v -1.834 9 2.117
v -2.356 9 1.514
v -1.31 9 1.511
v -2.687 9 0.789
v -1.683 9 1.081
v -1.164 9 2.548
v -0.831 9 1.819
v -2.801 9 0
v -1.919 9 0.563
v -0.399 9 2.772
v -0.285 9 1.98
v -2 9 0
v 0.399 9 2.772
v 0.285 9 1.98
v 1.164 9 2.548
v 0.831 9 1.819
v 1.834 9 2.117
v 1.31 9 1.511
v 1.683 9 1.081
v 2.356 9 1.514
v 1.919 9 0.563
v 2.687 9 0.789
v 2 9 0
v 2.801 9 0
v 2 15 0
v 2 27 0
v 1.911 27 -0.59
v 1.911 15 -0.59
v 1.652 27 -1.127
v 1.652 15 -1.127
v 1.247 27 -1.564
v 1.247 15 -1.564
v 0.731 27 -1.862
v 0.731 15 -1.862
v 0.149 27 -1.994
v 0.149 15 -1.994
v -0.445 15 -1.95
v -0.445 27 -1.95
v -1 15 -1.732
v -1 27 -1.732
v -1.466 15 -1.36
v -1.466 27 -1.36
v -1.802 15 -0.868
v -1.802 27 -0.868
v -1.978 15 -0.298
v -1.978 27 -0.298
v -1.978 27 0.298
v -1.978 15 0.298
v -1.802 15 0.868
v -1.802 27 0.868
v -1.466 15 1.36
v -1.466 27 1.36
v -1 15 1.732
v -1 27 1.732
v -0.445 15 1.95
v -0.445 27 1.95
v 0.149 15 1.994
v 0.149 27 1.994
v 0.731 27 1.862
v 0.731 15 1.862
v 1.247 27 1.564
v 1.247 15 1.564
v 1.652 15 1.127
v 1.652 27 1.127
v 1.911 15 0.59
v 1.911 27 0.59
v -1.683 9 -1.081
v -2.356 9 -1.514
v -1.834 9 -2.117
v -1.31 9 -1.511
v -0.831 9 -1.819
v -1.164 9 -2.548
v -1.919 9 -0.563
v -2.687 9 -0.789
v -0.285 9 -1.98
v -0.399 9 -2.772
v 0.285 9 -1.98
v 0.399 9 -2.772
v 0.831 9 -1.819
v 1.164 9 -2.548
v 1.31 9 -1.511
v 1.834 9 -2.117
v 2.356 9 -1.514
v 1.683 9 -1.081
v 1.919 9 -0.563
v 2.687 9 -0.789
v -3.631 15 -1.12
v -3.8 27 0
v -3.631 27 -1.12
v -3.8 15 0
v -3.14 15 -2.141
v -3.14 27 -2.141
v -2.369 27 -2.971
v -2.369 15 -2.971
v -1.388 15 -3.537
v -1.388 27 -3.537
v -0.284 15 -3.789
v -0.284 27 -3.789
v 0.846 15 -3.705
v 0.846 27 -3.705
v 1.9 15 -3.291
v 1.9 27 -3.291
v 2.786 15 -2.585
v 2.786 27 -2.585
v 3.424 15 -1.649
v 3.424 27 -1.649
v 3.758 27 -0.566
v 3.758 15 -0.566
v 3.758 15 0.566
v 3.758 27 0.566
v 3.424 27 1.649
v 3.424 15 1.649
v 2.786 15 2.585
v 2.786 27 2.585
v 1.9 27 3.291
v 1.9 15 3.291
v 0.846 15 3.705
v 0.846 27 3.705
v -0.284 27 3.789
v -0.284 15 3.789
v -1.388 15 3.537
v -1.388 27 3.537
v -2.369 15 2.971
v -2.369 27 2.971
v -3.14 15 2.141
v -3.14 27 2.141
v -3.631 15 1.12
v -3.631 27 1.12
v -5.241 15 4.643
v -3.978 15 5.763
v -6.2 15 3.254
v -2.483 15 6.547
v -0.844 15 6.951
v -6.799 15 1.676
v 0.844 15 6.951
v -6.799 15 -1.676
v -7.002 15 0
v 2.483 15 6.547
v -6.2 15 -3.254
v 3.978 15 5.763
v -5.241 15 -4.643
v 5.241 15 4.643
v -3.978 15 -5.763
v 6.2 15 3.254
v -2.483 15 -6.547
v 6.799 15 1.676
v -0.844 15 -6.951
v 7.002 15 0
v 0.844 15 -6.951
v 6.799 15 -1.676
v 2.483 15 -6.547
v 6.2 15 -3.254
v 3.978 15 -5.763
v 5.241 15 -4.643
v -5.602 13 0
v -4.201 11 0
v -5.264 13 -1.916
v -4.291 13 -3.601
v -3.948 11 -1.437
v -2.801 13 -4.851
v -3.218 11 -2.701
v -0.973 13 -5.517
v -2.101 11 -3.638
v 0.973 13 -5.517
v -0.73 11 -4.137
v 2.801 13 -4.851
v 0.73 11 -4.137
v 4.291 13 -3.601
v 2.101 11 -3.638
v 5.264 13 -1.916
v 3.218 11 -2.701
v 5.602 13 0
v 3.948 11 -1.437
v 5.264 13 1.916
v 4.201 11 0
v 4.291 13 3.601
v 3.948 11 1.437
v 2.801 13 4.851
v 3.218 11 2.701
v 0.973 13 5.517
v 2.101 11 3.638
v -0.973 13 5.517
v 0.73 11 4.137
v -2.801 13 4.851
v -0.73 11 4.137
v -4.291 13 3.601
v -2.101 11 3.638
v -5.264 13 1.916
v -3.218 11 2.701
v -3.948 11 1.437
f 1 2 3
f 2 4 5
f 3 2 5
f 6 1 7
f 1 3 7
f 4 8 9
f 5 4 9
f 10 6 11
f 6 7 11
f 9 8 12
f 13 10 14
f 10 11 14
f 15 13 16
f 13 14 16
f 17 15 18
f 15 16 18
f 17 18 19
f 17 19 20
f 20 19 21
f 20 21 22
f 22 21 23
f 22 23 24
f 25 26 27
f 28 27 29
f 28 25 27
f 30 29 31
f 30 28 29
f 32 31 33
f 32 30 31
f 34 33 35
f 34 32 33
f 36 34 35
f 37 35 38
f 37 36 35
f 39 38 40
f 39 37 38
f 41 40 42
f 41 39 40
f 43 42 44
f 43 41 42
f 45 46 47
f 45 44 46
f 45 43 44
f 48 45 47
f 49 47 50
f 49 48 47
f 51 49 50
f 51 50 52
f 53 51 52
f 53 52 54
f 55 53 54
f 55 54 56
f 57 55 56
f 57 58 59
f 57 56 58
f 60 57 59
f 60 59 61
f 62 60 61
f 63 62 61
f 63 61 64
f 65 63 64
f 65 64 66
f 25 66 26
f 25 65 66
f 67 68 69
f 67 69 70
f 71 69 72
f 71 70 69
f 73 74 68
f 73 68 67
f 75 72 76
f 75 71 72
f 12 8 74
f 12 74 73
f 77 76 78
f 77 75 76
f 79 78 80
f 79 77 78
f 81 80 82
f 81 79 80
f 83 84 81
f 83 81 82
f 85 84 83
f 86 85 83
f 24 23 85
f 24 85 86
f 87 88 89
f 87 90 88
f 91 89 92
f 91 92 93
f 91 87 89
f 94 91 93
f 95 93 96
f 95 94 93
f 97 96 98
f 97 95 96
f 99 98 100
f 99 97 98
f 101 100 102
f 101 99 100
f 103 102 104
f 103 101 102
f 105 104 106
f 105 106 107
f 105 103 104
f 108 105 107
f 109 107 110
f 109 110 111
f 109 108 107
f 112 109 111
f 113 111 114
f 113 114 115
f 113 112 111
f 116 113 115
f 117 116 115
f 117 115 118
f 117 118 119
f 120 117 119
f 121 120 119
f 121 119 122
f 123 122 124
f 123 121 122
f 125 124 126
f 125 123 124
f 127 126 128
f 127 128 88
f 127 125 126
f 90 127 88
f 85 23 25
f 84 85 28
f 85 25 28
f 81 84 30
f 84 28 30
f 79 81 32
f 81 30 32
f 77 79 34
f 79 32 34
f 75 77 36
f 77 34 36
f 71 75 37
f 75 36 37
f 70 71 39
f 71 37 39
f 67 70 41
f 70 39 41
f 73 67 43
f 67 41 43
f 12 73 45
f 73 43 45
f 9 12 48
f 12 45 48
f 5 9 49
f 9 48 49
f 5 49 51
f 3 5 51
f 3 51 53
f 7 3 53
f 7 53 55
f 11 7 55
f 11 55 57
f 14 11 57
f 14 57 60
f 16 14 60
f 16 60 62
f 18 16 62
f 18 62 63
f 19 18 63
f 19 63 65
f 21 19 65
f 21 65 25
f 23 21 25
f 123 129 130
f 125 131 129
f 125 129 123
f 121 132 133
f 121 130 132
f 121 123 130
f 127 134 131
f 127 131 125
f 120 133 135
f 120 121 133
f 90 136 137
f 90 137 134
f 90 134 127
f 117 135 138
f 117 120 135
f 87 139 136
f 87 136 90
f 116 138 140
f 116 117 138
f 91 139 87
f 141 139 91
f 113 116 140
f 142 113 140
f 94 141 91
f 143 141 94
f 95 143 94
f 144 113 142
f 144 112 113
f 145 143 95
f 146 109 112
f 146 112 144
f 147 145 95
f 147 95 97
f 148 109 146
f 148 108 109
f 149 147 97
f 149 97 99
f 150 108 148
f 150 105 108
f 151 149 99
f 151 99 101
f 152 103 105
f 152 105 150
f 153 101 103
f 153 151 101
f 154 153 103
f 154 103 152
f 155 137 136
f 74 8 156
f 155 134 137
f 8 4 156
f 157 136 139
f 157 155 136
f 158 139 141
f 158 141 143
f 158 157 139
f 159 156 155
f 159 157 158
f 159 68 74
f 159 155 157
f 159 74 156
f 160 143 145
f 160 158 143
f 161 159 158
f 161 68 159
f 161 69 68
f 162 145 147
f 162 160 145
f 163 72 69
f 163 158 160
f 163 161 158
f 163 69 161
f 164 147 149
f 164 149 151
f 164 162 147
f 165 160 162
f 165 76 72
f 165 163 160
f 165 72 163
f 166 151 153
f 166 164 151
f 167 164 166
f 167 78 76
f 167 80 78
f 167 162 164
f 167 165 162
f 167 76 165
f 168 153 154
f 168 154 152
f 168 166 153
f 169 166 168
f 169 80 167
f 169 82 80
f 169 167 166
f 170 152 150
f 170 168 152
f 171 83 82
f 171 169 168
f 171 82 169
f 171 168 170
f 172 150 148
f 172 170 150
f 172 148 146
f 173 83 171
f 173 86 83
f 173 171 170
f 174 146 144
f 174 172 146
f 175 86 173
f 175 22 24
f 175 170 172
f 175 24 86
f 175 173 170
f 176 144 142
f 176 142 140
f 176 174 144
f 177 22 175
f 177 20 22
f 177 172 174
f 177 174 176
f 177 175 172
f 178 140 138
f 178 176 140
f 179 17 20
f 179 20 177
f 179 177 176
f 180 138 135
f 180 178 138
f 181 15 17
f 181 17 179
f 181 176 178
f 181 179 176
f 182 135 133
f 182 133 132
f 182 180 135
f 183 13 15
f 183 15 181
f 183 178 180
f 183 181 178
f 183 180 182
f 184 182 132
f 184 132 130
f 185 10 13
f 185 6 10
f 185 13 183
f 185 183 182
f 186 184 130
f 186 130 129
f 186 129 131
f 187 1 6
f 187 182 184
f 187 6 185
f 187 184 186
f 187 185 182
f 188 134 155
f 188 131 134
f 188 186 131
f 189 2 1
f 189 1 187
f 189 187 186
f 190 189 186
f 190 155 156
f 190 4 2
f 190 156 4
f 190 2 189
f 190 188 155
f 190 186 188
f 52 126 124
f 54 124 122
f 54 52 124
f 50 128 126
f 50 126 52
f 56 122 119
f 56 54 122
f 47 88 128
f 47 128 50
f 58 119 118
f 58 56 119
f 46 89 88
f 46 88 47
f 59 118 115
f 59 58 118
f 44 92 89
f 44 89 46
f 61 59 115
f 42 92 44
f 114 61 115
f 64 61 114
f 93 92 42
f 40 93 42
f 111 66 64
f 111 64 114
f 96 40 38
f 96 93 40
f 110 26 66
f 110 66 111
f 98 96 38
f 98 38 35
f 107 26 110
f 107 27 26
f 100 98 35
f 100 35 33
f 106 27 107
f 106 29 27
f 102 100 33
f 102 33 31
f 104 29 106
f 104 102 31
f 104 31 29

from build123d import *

# Parameters (mm, degrees)
SKETCH002_R             = 2
POCKET_DEPTH            = 10.001
POCKET_DEPTH_BACK       = 12.001
SKETCH003_W             = 10
SKETCH003_H             = 3.516841
POCKET001_DEPTH         = 7.003075
POCKET001_DEPTH_BACK    = 7.003075
BODY001_PLACEMENT_ANGLE = 180


with BuildPart() as part:
    # Sketch001 → Revolution001 (revolve)
    with BuildSketch(Plane.XY):
        Polygon((0, -12), (-3.8, -12), (-3.8, 0), (-7.002075, 0), (0, 10), align=None)
    revolve(axis=Axis((0, 0, 0), (0, 1, 0)))

    # Sketch002 → Pocket (cut, two sides)
    with BuildSketch(Plane.XZ) as pocket_sk:
        Circle(SKETCH002_R)
    extrude(amount=-POCKET_DEPTH, mode=Mode.SUBTRACT)
    extrude(pocket_sk.sketch, amount=POCKET_DEPTH_BACK, mode=Mode.SUBTRACT)

    # Sketch003 → Pocket001 (cut, two sides)
    with BuildSketch(Plane.XY) as pocket001_sk:
        with Locations((0, 7.75842)):
            Rectangle(SKETCH003_W, SKETCH003_H)
    extrude(amount=-POCKET001_DEPTH, mode=Mode.SUBTRACT)
    extrude(pocket001_sk.sketch, amount=POCKET001_DEPTH_BACK, mode=Mode.SUBTRACT)


with BuildPart() as part_1:
    # Body001 placement: moved
    add(part.part.moved(Location((0, 15, 0))).rotate(Axis((0, 15, 0), (1, 0, 0)), BODY001_PLACEMENT_ANGLE))


solid = part_1.part
